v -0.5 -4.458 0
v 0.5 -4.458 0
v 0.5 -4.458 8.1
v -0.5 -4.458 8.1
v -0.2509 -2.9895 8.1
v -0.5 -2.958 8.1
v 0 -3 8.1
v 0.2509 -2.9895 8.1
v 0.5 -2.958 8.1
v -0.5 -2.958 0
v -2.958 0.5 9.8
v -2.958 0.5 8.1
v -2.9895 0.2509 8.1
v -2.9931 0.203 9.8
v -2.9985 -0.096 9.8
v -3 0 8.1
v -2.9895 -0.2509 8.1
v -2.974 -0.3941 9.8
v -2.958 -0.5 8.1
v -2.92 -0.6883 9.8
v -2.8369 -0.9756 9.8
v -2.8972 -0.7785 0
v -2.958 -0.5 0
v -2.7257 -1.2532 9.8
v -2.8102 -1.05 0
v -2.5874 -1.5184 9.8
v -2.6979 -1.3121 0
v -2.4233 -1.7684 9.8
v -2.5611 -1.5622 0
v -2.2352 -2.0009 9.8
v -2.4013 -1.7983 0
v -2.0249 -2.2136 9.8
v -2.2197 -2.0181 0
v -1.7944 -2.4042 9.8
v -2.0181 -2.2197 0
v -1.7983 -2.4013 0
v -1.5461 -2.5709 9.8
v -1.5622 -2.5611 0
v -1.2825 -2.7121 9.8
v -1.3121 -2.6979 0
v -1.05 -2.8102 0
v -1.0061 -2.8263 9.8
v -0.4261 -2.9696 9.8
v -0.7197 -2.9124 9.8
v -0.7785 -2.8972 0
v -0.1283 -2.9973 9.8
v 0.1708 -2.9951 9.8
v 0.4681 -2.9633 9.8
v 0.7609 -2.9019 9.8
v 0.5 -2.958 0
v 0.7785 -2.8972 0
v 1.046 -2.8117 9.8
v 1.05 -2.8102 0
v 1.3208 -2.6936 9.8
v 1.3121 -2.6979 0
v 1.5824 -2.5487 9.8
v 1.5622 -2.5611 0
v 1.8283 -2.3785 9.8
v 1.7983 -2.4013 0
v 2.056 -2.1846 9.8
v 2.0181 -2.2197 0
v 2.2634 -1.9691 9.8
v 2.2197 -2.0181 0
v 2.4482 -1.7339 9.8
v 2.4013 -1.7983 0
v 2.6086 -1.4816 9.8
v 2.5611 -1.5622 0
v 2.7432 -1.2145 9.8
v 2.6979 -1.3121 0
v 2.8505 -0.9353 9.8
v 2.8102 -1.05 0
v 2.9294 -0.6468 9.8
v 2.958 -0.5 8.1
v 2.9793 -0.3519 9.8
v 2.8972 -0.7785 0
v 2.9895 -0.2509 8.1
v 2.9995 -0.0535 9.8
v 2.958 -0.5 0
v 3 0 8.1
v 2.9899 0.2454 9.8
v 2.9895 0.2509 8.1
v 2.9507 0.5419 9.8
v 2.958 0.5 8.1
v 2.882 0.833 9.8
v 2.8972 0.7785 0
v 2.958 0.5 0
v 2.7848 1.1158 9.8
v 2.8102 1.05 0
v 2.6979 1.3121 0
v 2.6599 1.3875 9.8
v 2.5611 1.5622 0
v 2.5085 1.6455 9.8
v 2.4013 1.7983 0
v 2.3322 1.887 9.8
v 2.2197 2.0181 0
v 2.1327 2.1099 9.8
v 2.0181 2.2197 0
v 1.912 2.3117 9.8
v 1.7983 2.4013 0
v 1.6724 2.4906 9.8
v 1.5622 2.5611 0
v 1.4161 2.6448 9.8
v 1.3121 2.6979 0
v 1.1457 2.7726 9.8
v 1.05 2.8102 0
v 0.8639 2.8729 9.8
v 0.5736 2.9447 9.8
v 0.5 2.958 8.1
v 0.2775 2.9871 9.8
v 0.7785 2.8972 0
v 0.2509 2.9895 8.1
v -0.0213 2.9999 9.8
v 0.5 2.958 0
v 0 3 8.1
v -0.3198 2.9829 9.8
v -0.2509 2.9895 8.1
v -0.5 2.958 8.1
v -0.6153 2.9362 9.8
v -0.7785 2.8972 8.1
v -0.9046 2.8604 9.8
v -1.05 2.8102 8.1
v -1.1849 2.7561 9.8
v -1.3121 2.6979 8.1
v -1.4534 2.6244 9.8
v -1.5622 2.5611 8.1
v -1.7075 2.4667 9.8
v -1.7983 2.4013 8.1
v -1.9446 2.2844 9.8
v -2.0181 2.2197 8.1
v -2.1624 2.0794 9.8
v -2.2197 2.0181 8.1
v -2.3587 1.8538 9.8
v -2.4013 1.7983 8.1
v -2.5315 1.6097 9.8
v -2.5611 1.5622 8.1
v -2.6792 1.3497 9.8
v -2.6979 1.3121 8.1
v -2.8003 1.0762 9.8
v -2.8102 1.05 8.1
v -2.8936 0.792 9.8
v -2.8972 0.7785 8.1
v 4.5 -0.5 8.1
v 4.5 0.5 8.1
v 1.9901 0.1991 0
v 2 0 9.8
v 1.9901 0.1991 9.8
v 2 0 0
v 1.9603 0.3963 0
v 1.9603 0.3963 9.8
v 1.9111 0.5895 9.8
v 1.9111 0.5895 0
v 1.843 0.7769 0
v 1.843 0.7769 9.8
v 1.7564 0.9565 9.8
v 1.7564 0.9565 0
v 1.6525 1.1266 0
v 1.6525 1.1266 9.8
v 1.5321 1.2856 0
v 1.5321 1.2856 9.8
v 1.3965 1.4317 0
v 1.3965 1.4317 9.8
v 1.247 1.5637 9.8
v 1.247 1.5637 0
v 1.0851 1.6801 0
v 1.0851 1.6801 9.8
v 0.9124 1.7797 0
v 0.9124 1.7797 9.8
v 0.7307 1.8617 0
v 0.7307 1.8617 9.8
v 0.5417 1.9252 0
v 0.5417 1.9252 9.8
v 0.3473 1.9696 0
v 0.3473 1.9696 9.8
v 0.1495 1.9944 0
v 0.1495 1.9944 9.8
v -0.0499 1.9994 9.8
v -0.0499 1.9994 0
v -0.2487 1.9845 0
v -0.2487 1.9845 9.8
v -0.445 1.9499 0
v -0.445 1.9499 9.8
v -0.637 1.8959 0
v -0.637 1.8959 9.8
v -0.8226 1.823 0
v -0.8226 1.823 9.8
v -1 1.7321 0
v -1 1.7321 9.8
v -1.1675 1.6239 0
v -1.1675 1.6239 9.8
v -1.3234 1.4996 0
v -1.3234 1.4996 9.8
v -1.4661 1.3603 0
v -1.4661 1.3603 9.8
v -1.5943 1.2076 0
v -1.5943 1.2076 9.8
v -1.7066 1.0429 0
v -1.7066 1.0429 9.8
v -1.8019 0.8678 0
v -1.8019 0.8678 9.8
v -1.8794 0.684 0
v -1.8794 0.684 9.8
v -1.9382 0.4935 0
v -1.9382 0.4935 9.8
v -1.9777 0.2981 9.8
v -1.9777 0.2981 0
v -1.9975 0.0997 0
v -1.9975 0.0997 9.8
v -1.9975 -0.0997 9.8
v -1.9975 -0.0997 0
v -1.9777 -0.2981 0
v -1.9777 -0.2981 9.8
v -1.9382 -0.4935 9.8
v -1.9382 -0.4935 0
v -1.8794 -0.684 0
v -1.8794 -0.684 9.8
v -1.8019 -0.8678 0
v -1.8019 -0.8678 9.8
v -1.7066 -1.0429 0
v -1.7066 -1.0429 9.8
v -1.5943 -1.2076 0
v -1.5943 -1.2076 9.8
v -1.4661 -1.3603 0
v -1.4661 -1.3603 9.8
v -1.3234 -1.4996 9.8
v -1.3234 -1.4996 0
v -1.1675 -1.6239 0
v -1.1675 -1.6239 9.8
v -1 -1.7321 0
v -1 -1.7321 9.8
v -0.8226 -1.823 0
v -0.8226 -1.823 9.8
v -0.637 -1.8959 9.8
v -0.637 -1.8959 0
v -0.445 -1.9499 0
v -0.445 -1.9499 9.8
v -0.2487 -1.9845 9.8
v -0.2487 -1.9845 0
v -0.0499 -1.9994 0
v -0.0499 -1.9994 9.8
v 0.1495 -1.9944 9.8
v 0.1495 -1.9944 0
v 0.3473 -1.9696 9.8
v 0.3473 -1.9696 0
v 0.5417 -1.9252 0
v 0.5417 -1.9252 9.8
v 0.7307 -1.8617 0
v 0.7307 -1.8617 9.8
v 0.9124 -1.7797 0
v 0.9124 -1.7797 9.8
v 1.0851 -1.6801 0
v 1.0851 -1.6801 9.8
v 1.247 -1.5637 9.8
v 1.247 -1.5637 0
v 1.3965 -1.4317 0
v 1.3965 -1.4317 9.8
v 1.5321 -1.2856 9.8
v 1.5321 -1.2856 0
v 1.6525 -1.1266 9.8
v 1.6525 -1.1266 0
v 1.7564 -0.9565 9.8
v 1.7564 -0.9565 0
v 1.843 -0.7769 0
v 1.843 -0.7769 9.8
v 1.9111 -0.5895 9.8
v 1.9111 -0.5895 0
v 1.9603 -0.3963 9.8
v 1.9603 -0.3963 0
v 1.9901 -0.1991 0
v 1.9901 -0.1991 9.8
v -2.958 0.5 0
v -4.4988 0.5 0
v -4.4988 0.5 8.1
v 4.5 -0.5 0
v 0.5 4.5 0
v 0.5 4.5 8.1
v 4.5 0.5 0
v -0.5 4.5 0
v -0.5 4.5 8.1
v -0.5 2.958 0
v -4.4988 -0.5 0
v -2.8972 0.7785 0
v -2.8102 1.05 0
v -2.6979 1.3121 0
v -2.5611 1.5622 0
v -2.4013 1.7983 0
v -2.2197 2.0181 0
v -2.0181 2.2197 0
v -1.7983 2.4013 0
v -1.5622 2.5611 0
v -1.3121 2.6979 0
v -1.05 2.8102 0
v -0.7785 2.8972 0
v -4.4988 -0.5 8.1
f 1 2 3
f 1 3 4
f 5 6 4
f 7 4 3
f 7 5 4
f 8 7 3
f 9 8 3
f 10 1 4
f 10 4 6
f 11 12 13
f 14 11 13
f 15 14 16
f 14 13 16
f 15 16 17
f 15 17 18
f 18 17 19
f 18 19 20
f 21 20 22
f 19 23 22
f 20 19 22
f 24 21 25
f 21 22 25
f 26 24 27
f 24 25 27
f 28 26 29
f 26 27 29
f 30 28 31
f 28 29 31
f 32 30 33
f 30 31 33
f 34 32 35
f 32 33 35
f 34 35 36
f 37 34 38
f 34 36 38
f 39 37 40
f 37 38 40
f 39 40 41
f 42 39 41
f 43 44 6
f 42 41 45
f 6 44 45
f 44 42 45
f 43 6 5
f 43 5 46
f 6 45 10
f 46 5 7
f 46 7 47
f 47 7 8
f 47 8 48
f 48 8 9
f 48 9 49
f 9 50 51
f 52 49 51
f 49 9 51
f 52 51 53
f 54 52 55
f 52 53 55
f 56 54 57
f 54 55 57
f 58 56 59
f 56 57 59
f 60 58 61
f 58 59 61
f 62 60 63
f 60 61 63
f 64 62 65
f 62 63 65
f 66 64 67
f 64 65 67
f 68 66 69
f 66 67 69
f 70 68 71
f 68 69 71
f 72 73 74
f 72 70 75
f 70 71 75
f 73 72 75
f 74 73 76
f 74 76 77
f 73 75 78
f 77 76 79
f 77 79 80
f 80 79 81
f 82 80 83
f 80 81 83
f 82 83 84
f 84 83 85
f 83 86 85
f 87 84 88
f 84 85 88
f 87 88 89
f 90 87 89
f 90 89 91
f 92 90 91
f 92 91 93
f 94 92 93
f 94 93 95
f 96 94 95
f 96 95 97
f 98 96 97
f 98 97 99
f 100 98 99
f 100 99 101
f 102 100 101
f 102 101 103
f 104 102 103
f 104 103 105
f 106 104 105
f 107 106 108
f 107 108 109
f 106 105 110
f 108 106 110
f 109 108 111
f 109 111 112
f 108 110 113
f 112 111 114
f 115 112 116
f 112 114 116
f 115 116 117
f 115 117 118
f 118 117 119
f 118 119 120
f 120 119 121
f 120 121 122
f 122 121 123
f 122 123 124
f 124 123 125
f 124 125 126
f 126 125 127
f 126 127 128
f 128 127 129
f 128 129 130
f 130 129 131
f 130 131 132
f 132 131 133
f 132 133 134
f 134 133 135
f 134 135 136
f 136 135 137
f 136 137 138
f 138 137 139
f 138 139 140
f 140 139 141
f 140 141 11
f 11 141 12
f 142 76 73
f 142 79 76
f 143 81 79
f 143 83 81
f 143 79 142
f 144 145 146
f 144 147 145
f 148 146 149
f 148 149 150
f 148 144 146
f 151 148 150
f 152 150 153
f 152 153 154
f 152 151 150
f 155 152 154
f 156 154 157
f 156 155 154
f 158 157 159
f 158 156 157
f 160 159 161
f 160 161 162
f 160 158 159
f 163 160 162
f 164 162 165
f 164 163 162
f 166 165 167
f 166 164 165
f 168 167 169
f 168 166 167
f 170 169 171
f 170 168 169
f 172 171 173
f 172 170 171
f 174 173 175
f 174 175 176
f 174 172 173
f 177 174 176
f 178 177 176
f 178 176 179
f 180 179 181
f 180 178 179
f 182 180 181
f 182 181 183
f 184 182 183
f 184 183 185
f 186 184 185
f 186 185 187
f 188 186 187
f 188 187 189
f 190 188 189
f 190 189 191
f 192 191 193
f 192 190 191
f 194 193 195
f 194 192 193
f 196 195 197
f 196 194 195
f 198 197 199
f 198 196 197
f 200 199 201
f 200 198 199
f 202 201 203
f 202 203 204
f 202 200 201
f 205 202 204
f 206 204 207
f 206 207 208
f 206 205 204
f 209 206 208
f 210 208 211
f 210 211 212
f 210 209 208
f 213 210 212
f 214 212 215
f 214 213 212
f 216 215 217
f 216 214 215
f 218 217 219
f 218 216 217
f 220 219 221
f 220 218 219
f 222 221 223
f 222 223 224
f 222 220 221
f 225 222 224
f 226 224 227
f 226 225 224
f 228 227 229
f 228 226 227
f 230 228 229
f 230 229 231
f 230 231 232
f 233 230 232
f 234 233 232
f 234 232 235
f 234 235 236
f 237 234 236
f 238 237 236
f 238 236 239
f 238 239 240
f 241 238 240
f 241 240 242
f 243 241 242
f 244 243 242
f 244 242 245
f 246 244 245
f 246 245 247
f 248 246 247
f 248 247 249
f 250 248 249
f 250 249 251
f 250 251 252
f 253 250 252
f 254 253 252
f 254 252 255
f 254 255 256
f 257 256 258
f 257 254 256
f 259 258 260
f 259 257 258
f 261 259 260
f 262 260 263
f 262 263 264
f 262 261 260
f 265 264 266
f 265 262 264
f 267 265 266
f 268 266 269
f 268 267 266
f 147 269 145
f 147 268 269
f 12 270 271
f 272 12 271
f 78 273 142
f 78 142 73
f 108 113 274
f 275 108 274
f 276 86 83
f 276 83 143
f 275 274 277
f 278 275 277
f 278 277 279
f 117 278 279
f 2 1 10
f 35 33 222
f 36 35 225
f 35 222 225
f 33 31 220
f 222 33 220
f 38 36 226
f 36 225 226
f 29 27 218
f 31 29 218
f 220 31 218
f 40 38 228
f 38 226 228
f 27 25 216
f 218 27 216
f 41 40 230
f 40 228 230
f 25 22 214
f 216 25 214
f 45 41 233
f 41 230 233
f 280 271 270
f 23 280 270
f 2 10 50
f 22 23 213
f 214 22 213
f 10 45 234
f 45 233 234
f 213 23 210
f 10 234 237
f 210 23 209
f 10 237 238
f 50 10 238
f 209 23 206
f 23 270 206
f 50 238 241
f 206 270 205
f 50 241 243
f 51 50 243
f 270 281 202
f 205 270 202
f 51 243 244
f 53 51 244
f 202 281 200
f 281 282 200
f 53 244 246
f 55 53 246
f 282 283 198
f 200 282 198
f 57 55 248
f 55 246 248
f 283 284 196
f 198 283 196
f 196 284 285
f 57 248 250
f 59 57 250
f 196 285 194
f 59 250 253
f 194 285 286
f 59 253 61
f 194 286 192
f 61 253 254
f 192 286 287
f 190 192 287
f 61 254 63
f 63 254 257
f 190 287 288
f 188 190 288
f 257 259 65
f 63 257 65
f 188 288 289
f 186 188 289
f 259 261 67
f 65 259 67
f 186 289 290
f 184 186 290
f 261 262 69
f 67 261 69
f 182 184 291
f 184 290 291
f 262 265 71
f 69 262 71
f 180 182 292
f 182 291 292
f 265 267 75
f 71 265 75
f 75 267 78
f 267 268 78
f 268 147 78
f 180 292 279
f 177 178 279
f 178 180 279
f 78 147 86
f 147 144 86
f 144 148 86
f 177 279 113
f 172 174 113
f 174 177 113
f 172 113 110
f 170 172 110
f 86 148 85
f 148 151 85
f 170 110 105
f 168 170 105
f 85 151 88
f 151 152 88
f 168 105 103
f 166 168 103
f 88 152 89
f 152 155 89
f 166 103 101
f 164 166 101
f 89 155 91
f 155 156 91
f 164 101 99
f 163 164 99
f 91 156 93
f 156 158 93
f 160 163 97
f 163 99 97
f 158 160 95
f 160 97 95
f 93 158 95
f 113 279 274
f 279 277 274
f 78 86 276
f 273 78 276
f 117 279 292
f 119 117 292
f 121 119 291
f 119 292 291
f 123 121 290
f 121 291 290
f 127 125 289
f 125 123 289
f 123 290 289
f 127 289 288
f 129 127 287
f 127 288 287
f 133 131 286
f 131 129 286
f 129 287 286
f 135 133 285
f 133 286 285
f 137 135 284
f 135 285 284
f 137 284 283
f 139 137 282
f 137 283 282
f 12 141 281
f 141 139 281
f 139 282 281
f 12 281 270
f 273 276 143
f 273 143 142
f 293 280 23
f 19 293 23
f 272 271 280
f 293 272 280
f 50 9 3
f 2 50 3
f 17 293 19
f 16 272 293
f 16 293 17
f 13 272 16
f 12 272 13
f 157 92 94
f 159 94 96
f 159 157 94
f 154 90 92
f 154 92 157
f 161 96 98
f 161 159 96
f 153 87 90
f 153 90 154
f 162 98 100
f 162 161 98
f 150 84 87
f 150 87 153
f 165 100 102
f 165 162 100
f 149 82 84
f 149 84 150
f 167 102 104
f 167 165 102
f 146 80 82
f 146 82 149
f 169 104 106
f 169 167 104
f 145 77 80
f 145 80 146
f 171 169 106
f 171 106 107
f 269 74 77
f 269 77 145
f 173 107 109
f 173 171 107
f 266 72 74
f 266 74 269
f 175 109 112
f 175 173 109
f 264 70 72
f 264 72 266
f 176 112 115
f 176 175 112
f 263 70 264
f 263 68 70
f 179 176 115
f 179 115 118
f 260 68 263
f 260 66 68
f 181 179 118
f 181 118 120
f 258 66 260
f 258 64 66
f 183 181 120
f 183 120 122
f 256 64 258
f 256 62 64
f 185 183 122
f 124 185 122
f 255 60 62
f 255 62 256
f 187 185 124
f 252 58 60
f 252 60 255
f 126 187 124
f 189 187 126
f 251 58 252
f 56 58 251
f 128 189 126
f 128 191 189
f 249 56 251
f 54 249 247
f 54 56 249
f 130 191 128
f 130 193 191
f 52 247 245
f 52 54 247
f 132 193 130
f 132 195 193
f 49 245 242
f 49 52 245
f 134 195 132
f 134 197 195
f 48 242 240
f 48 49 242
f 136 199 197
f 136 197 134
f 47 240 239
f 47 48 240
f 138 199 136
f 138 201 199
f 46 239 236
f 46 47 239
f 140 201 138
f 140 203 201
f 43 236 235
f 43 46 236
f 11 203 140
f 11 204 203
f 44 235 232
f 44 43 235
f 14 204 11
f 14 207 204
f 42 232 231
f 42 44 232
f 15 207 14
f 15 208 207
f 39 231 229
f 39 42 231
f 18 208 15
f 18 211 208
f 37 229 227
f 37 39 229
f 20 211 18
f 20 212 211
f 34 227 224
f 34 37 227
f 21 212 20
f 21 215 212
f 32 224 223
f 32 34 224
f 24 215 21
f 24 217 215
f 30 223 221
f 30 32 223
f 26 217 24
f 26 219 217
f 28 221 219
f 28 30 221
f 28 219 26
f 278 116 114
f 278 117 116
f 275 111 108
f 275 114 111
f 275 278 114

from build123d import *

# Parameters (mm, degrees)
ESBO_O1_R                = 3
ESBO_O1_R_2              = 2
RESSALTO_EXTRUS_O1_DEPTH = 8.1
RESSALTO_EXTRUS_O2_DEPTH = 8.1
RESSALTO_EXTRUS_O3_DEPTH = 8.1
RESSALTO_EXTRUS_O4_START = -8.1
ESBO_O6_R                = 2
RESSALTO_EXTRUS_O4_DEPTH = 8.1
ESBO_O7_R                = 3
ESBO_O7_R_2              = 2
RESSALTO_EXTRUS_O5_DEPTH = 1.7


with BuildPart() as part:
    # Esboço1 → Ressalto-extrusão1 (new body)
    with BuildSketch(Plane.XY):
        Circle(ESBO_O1_R)
        Circle(ESBO_O1_R_2, mode=Mode.SUBTRACT)
    extrude(amount=RESSALTO_EXTRUS_O1_DEPTH)

    # Esboço2 → Ressalto-extrusão2 (add)
    with BuildSketch(Plane.XY):
        with BuildLine():
            Line((-2.958039892, 0.5), (-2.998801098, 0.5))
            Line((-2.998801098, 0.5), (-4.498801098, 0.5))
            Line((-4.498801098, 0.5), (-4.498801098, -0.5))
            Line((-4.498801098, -0.5), (-3, -0.5))
            Line((-3, -0.5), (-2.958039892, -0.5))
            ThreePointArc((-2.958039892, -0.5), (-2.989491568, -0.250878781), (-3, 0))
            ThreePointArc((-3, 0), (-2.989491568, 0.250878781), (-2.958039892, 0.5))
        make_face()
    extrude(amount=RESSALTO_EXTRUS_O2_DEPTH)

    # Esboço3 → Ressalto-extrusão3 (add)
    with BuildSketch(Plane(origin=(0, 0, 0), x_dir=(-1, 0, 0), z_dir=(0, 0, -1))):
        with BuildLine():
            ThreePointArc((0.5, -2.958039892), (0.250878781, -2.989491568), (0, -3))
            ThreePointArc((0, -3), (-0.250878781, -2.989491568), (-0.5, -2.958039892))
            Line((-0.5, -2.958039892), (-0.5, -4.458039892))
            Line((-0.5, -4.458039892), (0.5, -4.458039892))
            Line((0.5, -4.458039892), (0.5, -3))
            Line((0.5, -3), (0.5, -2.958039892))
        make_face()
        with BuildLine():
            ThreePointArc((-2.958039892, -0.5), (-2.989491568, -0.250878781), (-3, 0))
            ThreePointArc((-3, 0), (-2.989491568, 0.250878781), (-2.958039892, 0.5))
            Line((-2.958039892, 0.5), (-3, 0.5))
            Line((-3, 0.5), (-4.5, 0.5))
            Line((-4.5, 0.5), (-4.5, -0.5))
            Line((-4.5, -0.5), (-2.958039892, -0.5))
        make_face()
        with BuildLine():
            Line((0.5, 4.5), (0.5, 3))
            Line((0.5, 3), (0.5, 2.958039892))
            ThreePointArc((0.5, 2.958039892), (0, 3), (-0.5, 2.958039892))
            Line((-0.5, 2.958039892), (-0.5, 3))
            Line((-0.5, 3), (-0.5, 4.5))
            Line((-0.5, 4.5), (0.5, 4.5))
        make_face()
    extrude(amount=-RESSALTO_EXTRUS_O3_DEPTH)

    # Esboço6 → Ressalto-extrusão4 (add)
    # profile 1 of 5: a face of its own
    with BuildSketch(Plane.XY.offset(8.1).offset(RESSALTO_EXTRUS_O4_START)):
        with BuildLine():
            ThreePointArc((2.958039892, 0.5), (2.121320344, 2.121320344), (0.5, 2.958039892))
            ThreePointArc((0.5, 2.958039892), (0.00124461, 2.999999742), (-0.497545425, 2.958453743))
            ThreePointArc((-0.497545425, 2.958453743), (-0.498772755, 2.958247072), (-0.5, 2.958039892))
            ThreePointArc((-0.5, 2.958039892), (-2.121320344, 2.121320344), (-2.958039892, 0.5))
            ThreePointArc((-2.958039892, 0.5), (-3, 0), (-2.958039892, -0.5))
            ThreePointArc((-2.958039892, -0.5), (-2.121320344, -2.121320344), (-0.5, -2.958039892))
            ThreePointArc((-0.5, -2.958039892), (0, -3), (0.5, -2.958039892))
            ThreePointArc((0.5, -2.958039892), (2.121320344, -2.121320344), (2.958039892, -0.5))
            ThreePointArc((2.958039892, -0.5), (2.989491568, -0.250878781), (3, 0))
            ThreePointArc((3, 0), (2.989491568, 0.250878781), (2.958039892, 0.5))
        make_face()
        Circle(ESBO_O6_R, mode=Mode.SUBTRACT)
    # profile 2 of 5: a face of its own
    with BuildSketch(Plane.XY.offset(8.1).offset(RESSALTO_EXTRUS_O4_START)):
        with BuildLine():
            ThreePointArc((-0.497545425, 2.958453743), (0.00124461, 2.999999742), (0.5, 2.958039892))
            Line((0.5, 2.958039892), (0.5, 4.5))
            Line((0.5, 4.5), (-0.497545425, 4.5))
            Line((-0.497545425, 4.5), (-0.497545425, 2.958453743))
        make_face()
    # profile 3 of 5: a face of its own
    with BuildSketch(Plane.XY.offset(8.1).offset(RESSALTO_EXTRUS_O4_START)):
        with BuildLine():
            Line((4.5, 0.5), (2.958039892, 0.5))
            ThreePointArc((2.958039892, 0.5), (2.989491568, 0.250878781), (3, 0))
            ThreePointArc((3, 0), (2.989491568, -0.250878781), (2.958039892, -0.5))
            Line((2.958039892, -0.5), (4.5, -0.5))
            Line((4.5, -0.5), (4.5, 0.5))
        make_face()
    # profile 4 of 5: a face of its own
    with BuildSketch(Plane.XY.offset(8.1).offset(RESSALTO_EXTRUS_O4_START)):
        with BuildLine():
            Line((0.5, -4.458039892), (0.5, -2.958039892))
            ThreePointArc((0.5, -2.958039892), (0, -3), (-0.5, -2.958039892))
            Line((-0.5, -2.958039892), (-0.5, -4.458039892))
            Line((-0.5, -4.458039892), (0.5, -4.458039892))
        make_face()
    # profile 5 of 5: a face of its own
    with BuildSketch(Plane.XY.offset(8.1).offset(RESSALTO_EXTRUS_O4_START)):
        with BuildLine():
            ThreePointArc((-2.958039892, -0.5), (-3, 0), (-2.958039892, 0.5))
            Line((-2.958039892, 0.5), (-4.498801098, 0.5))
            Line((-4.498801098, 0.5), (-4.498801098, -0.5))
            Line((-4.498801098, -0.5), (-2.958039892, -0.5))
        make_face()
    extrude(amount=RESSALTO_EXTRUS_O4_DEPTH)

    # Esboço7 → Ressalto-extrusão5 (add)
    with BuildSketch(Plane.XY.offset(8.1)):
        with Locations(Location((0, 0, 0), (0, 0, 170.405931773))):
            Circle(ESBO_O7_R)
        Circle(ESBO_O7_R_2, mode=Mode.SUBTRACT)
    extrude(amount=RESSALTO_EXTRUS_O5_DEPTH)


solid = part.part
